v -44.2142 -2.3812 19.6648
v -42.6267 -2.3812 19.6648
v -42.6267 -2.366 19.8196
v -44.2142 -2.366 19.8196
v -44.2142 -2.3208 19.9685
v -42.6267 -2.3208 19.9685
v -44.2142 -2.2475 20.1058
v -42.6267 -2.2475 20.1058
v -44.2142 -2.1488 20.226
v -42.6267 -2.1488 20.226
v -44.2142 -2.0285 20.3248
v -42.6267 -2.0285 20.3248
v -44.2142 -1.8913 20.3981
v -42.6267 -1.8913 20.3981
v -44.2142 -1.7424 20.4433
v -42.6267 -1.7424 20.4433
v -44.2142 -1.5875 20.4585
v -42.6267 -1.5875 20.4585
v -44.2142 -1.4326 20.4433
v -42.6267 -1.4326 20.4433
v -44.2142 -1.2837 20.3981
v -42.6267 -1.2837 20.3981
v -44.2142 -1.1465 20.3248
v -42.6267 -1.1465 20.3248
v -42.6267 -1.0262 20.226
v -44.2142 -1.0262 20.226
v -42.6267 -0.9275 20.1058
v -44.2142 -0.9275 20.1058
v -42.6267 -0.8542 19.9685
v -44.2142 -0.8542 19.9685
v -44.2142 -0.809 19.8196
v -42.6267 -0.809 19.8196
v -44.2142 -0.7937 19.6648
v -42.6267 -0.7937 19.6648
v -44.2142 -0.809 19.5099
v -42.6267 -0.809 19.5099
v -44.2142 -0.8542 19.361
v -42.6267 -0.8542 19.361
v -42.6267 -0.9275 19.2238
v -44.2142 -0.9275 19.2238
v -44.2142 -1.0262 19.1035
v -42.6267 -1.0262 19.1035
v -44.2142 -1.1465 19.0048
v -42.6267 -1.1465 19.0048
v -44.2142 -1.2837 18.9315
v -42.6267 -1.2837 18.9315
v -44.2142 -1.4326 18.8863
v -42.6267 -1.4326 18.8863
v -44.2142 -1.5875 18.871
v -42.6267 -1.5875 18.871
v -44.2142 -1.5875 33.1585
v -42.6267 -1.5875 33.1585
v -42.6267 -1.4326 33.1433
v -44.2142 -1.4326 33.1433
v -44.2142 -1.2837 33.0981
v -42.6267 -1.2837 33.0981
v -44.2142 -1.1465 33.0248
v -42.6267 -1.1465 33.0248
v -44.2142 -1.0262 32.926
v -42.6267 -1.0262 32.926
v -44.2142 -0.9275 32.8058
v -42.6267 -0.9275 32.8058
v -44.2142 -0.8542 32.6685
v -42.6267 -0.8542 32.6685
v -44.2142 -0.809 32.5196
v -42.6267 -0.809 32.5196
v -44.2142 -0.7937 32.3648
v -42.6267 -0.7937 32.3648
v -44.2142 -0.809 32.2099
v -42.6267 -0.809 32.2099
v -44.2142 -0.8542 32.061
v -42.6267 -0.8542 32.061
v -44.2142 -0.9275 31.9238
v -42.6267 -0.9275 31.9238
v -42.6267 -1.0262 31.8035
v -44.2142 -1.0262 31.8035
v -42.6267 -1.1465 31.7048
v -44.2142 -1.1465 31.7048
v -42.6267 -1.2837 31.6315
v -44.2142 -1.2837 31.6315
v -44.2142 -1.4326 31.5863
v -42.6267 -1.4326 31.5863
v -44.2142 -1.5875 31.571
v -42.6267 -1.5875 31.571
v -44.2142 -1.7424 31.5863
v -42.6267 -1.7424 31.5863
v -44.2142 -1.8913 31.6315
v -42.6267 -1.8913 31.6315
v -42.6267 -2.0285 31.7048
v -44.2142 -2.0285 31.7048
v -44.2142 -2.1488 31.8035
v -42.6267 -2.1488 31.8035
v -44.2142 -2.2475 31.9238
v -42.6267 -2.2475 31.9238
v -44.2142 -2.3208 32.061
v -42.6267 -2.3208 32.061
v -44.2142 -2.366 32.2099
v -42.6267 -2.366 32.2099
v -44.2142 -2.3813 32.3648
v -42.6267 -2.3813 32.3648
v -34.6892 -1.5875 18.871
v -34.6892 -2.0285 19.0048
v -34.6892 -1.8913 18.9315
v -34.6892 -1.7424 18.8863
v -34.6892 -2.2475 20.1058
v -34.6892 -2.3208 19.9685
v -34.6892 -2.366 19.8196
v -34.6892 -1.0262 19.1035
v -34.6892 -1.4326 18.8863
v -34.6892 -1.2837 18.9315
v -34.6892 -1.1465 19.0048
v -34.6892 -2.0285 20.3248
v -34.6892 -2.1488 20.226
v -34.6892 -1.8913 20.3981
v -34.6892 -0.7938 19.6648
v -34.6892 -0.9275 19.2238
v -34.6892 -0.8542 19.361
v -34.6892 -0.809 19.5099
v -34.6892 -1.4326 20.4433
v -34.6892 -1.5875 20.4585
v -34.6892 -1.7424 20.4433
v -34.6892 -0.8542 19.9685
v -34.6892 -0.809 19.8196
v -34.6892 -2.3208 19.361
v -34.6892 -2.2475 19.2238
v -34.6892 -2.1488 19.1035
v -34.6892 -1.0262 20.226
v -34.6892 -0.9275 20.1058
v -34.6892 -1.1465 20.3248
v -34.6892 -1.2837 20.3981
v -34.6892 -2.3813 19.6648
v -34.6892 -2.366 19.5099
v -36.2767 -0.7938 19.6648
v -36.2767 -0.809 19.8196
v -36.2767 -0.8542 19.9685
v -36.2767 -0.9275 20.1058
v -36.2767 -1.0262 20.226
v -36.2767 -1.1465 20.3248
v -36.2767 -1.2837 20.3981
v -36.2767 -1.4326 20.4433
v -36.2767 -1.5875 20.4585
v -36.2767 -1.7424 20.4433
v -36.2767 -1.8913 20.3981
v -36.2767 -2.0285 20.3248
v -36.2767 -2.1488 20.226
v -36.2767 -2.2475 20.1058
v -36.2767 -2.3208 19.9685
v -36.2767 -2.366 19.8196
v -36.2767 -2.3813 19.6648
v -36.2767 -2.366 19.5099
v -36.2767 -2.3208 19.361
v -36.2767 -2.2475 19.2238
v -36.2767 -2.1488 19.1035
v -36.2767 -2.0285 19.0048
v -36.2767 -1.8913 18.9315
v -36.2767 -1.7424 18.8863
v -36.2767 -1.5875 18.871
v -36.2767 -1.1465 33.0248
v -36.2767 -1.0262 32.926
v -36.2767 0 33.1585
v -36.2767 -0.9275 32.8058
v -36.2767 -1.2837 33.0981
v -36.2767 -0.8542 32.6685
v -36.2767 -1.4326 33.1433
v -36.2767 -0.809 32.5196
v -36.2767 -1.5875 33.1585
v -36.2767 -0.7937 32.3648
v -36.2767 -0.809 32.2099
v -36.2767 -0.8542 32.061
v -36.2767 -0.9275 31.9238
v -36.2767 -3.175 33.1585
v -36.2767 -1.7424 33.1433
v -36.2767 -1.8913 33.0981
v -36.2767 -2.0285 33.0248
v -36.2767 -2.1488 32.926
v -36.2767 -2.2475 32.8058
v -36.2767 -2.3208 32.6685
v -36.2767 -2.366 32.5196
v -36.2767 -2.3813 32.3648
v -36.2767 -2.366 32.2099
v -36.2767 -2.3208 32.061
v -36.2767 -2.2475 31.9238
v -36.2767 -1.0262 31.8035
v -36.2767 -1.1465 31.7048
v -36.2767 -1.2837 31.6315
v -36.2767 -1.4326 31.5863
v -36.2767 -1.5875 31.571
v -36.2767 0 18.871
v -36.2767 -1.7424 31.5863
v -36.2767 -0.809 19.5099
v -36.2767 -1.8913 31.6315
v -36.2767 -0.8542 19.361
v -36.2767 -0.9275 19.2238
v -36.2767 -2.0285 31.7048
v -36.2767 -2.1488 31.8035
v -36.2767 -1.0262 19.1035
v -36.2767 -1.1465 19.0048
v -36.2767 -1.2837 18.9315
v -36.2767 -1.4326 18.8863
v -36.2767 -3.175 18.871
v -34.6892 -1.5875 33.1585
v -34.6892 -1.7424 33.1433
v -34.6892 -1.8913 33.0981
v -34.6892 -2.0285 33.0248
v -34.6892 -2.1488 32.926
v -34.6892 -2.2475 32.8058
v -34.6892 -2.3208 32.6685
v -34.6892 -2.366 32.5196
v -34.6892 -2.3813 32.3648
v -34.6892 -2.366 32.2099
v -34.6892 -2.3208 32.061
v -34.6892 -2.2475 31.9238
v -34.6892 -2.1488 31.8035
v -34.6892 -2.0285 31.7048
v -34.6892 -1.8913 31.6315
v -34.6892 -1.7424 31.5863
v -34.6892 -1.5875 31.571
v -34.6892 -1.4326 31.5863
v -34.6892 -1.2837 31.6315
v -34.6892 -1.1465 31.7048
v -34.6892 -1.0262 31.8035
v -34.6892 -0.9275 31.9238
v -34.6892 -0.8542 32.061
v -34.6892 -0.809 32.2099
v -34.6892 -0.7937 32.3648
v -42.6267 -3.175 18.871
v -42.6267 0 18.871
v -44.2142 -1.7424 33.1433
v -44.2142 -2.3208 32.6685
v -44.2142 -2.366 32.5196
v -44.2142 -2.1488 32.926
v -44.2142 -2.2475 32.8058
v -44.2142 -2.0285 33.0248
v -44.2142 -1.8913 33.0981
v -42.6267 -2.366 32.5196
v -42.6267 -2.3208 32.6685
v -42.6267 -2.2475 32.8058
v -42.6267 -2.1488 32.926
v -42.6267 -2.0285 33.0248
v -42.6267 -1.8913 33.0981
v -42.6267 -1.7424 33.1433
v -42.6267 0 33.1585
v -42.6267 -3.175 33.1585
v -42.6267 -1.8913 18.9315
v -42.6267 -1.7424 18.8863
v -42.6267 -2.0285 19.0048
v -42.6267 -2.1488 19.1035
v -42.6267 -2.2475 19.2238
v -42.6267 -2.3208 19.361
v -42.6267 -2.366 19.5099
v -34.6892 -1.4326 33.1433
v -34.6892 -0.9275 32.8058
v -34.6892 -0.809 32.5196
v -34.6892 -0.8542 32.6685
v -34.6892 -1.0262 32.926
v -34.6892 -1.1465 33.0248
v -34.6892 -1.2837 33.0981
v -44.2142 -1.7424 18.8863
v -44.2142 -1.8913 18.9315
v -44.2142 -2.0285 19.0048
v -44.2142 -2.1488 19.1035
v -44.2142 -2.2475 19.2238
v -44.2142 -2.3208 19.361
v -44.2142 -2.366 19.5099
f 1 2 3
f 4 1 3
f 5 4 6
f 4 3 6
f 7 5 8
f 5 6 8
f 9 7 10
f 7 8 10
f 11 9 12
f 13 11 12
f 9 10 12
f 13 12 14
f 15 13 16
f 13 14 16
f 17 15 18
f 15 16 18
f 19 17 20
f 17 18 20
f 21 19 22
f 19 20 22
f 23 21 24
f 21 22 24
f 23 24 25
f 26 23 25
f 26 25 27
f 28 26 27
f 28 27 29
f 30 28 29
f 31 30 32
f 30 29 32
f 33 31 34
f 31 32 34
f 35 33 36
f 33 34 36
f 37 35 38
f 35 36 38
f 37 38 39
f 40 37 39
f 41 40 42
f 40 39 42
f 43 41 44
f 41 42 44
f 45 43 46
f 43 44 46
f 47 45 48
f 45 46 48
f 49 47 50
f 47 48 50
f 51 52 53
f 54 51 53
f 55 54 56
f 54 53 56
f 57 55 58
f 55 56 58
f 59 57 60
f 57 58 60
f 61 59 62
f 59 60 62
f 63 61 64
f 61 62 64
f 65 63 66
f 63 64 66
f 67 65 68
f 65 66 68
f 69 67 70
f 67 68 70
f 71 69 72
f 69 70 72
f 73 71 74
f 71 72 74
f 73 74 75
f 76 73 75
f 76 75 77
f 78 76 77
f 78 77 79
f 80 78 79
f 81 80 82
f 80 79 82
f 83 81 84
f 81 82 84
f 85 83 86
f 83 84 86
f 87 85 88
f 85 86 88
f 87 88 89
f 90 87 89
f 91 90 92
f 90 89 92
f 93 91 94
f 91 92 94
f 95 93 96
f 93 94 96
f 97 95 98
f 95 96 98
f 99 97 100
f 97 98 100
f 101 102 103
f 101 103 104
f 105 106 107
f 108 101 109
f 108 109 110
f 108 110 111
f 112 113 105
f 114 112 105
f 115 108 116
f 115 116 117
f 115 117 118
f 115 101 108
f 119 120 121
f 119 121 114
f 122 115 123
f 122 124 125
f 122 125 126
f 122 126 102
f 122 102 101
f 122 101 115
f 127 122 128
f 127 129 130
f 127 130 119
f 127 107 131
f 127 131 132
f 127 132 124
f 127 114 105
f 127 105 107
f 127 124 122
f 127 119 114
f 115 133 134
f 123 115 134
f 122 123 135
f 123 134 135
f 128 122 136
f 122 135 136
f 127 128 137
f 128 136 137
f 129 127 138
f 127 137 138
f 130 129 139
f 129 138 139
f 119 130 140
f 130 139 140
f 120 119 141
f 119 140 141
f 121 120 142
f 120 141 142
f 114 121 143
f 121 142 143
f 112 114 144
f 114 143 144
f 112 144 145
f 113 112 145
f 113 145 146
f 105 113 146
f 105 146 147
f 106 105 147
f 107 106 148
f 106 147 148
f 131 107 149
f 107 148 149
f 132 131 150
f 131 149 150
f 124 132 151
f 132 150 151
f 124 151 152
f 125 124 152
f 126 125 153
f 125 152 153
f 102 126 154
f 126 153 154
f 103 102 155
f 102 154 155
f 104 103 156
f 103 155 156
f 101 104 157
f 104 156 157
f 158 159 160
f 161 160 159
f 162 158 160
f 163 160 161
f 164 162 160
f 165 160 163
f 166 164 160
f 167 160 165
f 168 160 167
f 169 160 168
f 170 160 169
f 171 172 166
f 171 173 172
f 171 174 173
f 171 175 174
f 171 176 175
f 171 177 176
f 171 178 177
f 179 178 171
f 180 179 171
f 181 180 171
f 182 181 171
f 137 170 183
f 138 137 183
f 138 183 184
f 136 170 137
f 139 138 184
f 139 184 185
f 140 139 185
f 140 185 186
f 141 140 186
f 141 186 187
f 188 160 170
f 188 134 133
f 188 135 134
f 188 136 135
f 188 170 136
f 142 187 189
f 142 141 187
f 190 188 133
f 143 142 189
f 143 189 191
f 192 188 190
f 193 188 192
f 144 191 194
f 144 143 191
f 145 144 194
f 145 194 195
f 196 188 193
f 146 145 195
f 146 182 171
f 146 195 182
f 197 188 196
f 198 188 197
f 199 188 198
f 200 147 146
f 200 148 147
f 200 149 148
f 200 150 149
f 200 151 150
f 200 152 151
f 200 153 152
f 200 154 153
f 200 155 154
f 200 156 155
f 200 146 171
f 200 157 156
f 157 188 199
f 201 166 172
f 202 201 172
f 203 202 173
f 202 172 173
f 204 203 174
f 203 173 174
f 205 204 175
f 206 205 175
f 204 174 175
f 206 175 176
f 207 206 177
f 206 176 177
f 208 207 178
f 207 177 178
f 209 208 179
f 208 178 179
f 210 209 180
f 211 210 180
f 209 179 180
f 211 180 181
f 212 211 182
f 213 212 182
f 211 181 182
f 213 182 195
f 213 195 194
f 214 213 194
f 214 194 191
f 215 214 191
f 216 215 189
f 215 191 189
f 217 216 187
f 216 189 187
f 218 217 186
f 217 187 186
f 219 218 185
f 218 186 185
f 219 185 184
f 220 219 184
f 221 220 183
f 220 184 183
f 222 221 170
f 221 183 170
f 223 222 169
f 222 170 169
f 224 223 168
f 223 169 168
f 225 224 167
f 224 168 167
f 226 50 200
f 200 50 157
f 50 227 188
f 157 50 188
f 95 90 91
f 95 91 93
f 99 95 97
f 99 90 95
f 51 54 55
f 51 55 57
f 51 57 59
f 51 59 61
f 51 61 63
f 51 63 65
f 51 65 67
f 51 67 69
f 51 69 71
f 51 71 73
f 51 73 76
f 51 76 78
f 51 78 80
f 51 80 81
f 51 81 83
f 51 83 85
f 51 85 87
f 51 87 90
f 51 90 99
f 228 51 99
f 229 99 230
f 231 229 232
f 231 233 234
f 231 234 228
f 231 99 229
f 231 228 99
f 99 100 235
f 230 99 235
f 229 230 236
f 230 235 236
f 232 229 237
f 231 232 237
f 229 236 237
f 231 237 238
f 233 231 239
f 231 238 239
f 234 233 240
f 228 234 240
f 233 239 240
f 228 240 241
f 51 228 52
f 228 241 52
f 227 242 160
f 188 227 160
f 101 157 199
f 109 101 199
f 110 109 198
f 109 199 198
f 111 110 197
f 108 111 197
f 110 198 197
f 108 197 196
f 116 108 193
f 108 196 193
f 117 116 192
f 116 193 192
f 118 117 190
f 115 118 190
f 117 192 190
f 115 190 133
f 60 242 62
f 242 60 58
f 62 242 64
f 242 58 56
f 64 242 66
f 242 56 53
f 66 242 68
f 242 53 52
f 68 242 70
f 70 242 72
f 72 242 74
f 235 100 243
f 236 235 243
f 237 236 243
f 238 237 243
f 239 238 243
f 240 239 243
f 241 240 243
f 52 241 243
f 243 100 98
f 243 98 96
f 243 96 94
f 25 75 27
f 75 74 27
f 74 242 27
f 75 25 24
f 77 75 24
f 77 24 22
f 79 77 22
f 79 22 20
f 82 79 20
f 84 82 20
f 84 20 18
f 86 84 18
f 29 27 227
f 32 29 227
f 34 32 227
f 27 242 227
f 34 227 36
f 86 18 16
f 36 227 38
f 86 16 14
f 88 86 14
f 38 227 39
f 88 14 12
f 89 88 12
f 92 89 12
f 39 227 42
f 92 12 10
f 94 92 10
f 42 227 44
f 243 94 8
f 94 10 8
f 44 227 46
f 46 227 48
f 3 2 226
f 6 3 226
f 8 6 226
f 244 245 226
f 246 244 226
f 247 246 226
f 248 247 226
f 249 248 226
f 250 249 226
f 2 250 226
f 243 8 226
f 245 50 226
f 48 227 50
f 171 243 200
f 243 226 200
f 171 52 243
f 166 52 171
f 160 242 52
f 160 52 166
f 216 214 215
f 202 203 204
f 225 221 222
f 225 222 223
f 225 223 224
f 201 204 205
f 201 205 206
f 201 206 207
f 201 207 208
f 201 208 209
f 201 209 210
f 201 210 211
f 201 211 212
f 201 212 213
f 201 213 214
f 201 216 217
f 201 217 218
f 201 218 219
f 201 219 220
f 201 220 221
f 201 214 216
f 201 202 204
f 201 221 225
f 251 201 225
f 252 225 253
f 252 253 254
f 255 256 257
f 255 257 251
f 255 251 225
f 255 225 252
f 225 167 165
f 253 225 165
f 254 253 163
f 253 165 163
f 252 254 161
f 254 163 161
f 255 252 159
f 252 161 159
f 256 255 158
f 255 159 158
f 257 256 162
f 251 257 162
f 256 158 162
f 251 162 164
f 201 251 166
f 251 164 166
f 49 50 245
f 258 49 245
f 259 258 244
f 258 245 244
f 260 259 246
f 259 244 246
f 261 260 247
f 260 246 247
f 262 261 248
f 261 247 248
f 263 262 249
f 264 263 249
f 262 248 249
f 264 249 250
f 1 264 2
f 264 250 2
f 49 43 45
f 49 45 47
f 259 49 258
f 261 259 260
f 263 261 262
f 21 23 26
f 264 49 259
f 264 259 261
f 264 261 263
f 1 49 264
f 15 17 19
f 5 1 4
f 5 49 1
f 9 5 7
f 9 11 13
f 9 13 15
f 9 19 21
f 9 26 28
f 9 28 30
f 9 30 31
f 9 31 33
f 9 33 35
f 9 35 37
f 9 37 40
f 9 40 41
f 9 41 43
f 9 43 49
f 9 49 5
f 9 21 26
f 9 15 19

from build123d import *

# Parameters (mm, degrees)
F0_W     = 6.35
F0_H     = 12.7
F1_DEPTH = 3.175
F2_DEPTH = 0.79375
F3_DEPTH = 0.79375
F5_DEPTH = 1.5875
F7_DEPTH = 1.5875


with BuildPart() as f1:
    # F0 (on Front) → F1 (new body)
    with BuildSketch(Plane.XZ):
        with Locations((-39.4517260957, 26.0147806257)):
            Rectangle(F0_W, F0_H)
    extrude(amount=F1_DEPTH)

    # F2 (add): a face of the model
    f2_faces = [f1.faces().sort_by_distance(p)[0] for p in [
        (-39.4517260957, -1.5875, 19.6647806257),
    ]]
    extrude(f2_faces, amount=F2_DEPTH)

    # F3 (add): a face of the model
    f3_faces = [f1.faces().sort_by_distance(p)[0] for p in [
        (-39.4517260957, -1.5875, 32.3647806257),
    ]]
    extrude(f3_faces, amount=F3_DEPTH)

    # F4 (on face) → F5 (join)
    with BuildSketch(Plane(origin=(-42.6267260957, 0, 0), x_dir=(0, -1, 0), z_dir=(-1, 0, 0))):
        with BuildLine():
            ThreePointArc((1.5875, 33.1585306257), (1.0262339924, 31.8035146181), (2.38125, 32.3647806257))
            ThreePointArc((2.38125, 32.3647806257), (2.1487660076, 32.9260466333), (1.5875, 33.1585306257))
        make_face()
        with BuildLine():
            ThreePointArc((2.38125, 19.6647806257), (1.0262339924, 20.2260466333), (1.5875, 18.8710306257))
            ThreePointArc((1.5875, 18.8710306257), (2.1487660076, 19.1035146181), (2.38125, 19.6647806257))
        make_face()
    extrude(amount=F5_DEPTH)

    # F6 (on face) → F7 (join)
    with BuildSketch(Plane.YZ.offset(-36.2767260957)):
        with BuildLine():
            ThreePointArc((-1.5875, 33.1585306257), (-2.1487660076, 31.8035146181), (-0.79375, 32.3647806257))
            ThreePointArc((-0.79375, 32.3647806257), (-1.0262339924, 32.9260466333), (-1.5875, 33.1585306257))
        make_face()
        with BuildLine():
            ThreePointArc((-0.79375, 19.6647806257), (-2.1487660076, 20.2260466333), (-1.5875, 18.8710306257))
            ThreePointArc((-1.5875, 18.8710306257), (-1.0262339924, 19.1035146181), (-0.79375, 19.6647806257))
        make_face()
    extrude(amount=F7_DEPTH)


solid = f1.part
